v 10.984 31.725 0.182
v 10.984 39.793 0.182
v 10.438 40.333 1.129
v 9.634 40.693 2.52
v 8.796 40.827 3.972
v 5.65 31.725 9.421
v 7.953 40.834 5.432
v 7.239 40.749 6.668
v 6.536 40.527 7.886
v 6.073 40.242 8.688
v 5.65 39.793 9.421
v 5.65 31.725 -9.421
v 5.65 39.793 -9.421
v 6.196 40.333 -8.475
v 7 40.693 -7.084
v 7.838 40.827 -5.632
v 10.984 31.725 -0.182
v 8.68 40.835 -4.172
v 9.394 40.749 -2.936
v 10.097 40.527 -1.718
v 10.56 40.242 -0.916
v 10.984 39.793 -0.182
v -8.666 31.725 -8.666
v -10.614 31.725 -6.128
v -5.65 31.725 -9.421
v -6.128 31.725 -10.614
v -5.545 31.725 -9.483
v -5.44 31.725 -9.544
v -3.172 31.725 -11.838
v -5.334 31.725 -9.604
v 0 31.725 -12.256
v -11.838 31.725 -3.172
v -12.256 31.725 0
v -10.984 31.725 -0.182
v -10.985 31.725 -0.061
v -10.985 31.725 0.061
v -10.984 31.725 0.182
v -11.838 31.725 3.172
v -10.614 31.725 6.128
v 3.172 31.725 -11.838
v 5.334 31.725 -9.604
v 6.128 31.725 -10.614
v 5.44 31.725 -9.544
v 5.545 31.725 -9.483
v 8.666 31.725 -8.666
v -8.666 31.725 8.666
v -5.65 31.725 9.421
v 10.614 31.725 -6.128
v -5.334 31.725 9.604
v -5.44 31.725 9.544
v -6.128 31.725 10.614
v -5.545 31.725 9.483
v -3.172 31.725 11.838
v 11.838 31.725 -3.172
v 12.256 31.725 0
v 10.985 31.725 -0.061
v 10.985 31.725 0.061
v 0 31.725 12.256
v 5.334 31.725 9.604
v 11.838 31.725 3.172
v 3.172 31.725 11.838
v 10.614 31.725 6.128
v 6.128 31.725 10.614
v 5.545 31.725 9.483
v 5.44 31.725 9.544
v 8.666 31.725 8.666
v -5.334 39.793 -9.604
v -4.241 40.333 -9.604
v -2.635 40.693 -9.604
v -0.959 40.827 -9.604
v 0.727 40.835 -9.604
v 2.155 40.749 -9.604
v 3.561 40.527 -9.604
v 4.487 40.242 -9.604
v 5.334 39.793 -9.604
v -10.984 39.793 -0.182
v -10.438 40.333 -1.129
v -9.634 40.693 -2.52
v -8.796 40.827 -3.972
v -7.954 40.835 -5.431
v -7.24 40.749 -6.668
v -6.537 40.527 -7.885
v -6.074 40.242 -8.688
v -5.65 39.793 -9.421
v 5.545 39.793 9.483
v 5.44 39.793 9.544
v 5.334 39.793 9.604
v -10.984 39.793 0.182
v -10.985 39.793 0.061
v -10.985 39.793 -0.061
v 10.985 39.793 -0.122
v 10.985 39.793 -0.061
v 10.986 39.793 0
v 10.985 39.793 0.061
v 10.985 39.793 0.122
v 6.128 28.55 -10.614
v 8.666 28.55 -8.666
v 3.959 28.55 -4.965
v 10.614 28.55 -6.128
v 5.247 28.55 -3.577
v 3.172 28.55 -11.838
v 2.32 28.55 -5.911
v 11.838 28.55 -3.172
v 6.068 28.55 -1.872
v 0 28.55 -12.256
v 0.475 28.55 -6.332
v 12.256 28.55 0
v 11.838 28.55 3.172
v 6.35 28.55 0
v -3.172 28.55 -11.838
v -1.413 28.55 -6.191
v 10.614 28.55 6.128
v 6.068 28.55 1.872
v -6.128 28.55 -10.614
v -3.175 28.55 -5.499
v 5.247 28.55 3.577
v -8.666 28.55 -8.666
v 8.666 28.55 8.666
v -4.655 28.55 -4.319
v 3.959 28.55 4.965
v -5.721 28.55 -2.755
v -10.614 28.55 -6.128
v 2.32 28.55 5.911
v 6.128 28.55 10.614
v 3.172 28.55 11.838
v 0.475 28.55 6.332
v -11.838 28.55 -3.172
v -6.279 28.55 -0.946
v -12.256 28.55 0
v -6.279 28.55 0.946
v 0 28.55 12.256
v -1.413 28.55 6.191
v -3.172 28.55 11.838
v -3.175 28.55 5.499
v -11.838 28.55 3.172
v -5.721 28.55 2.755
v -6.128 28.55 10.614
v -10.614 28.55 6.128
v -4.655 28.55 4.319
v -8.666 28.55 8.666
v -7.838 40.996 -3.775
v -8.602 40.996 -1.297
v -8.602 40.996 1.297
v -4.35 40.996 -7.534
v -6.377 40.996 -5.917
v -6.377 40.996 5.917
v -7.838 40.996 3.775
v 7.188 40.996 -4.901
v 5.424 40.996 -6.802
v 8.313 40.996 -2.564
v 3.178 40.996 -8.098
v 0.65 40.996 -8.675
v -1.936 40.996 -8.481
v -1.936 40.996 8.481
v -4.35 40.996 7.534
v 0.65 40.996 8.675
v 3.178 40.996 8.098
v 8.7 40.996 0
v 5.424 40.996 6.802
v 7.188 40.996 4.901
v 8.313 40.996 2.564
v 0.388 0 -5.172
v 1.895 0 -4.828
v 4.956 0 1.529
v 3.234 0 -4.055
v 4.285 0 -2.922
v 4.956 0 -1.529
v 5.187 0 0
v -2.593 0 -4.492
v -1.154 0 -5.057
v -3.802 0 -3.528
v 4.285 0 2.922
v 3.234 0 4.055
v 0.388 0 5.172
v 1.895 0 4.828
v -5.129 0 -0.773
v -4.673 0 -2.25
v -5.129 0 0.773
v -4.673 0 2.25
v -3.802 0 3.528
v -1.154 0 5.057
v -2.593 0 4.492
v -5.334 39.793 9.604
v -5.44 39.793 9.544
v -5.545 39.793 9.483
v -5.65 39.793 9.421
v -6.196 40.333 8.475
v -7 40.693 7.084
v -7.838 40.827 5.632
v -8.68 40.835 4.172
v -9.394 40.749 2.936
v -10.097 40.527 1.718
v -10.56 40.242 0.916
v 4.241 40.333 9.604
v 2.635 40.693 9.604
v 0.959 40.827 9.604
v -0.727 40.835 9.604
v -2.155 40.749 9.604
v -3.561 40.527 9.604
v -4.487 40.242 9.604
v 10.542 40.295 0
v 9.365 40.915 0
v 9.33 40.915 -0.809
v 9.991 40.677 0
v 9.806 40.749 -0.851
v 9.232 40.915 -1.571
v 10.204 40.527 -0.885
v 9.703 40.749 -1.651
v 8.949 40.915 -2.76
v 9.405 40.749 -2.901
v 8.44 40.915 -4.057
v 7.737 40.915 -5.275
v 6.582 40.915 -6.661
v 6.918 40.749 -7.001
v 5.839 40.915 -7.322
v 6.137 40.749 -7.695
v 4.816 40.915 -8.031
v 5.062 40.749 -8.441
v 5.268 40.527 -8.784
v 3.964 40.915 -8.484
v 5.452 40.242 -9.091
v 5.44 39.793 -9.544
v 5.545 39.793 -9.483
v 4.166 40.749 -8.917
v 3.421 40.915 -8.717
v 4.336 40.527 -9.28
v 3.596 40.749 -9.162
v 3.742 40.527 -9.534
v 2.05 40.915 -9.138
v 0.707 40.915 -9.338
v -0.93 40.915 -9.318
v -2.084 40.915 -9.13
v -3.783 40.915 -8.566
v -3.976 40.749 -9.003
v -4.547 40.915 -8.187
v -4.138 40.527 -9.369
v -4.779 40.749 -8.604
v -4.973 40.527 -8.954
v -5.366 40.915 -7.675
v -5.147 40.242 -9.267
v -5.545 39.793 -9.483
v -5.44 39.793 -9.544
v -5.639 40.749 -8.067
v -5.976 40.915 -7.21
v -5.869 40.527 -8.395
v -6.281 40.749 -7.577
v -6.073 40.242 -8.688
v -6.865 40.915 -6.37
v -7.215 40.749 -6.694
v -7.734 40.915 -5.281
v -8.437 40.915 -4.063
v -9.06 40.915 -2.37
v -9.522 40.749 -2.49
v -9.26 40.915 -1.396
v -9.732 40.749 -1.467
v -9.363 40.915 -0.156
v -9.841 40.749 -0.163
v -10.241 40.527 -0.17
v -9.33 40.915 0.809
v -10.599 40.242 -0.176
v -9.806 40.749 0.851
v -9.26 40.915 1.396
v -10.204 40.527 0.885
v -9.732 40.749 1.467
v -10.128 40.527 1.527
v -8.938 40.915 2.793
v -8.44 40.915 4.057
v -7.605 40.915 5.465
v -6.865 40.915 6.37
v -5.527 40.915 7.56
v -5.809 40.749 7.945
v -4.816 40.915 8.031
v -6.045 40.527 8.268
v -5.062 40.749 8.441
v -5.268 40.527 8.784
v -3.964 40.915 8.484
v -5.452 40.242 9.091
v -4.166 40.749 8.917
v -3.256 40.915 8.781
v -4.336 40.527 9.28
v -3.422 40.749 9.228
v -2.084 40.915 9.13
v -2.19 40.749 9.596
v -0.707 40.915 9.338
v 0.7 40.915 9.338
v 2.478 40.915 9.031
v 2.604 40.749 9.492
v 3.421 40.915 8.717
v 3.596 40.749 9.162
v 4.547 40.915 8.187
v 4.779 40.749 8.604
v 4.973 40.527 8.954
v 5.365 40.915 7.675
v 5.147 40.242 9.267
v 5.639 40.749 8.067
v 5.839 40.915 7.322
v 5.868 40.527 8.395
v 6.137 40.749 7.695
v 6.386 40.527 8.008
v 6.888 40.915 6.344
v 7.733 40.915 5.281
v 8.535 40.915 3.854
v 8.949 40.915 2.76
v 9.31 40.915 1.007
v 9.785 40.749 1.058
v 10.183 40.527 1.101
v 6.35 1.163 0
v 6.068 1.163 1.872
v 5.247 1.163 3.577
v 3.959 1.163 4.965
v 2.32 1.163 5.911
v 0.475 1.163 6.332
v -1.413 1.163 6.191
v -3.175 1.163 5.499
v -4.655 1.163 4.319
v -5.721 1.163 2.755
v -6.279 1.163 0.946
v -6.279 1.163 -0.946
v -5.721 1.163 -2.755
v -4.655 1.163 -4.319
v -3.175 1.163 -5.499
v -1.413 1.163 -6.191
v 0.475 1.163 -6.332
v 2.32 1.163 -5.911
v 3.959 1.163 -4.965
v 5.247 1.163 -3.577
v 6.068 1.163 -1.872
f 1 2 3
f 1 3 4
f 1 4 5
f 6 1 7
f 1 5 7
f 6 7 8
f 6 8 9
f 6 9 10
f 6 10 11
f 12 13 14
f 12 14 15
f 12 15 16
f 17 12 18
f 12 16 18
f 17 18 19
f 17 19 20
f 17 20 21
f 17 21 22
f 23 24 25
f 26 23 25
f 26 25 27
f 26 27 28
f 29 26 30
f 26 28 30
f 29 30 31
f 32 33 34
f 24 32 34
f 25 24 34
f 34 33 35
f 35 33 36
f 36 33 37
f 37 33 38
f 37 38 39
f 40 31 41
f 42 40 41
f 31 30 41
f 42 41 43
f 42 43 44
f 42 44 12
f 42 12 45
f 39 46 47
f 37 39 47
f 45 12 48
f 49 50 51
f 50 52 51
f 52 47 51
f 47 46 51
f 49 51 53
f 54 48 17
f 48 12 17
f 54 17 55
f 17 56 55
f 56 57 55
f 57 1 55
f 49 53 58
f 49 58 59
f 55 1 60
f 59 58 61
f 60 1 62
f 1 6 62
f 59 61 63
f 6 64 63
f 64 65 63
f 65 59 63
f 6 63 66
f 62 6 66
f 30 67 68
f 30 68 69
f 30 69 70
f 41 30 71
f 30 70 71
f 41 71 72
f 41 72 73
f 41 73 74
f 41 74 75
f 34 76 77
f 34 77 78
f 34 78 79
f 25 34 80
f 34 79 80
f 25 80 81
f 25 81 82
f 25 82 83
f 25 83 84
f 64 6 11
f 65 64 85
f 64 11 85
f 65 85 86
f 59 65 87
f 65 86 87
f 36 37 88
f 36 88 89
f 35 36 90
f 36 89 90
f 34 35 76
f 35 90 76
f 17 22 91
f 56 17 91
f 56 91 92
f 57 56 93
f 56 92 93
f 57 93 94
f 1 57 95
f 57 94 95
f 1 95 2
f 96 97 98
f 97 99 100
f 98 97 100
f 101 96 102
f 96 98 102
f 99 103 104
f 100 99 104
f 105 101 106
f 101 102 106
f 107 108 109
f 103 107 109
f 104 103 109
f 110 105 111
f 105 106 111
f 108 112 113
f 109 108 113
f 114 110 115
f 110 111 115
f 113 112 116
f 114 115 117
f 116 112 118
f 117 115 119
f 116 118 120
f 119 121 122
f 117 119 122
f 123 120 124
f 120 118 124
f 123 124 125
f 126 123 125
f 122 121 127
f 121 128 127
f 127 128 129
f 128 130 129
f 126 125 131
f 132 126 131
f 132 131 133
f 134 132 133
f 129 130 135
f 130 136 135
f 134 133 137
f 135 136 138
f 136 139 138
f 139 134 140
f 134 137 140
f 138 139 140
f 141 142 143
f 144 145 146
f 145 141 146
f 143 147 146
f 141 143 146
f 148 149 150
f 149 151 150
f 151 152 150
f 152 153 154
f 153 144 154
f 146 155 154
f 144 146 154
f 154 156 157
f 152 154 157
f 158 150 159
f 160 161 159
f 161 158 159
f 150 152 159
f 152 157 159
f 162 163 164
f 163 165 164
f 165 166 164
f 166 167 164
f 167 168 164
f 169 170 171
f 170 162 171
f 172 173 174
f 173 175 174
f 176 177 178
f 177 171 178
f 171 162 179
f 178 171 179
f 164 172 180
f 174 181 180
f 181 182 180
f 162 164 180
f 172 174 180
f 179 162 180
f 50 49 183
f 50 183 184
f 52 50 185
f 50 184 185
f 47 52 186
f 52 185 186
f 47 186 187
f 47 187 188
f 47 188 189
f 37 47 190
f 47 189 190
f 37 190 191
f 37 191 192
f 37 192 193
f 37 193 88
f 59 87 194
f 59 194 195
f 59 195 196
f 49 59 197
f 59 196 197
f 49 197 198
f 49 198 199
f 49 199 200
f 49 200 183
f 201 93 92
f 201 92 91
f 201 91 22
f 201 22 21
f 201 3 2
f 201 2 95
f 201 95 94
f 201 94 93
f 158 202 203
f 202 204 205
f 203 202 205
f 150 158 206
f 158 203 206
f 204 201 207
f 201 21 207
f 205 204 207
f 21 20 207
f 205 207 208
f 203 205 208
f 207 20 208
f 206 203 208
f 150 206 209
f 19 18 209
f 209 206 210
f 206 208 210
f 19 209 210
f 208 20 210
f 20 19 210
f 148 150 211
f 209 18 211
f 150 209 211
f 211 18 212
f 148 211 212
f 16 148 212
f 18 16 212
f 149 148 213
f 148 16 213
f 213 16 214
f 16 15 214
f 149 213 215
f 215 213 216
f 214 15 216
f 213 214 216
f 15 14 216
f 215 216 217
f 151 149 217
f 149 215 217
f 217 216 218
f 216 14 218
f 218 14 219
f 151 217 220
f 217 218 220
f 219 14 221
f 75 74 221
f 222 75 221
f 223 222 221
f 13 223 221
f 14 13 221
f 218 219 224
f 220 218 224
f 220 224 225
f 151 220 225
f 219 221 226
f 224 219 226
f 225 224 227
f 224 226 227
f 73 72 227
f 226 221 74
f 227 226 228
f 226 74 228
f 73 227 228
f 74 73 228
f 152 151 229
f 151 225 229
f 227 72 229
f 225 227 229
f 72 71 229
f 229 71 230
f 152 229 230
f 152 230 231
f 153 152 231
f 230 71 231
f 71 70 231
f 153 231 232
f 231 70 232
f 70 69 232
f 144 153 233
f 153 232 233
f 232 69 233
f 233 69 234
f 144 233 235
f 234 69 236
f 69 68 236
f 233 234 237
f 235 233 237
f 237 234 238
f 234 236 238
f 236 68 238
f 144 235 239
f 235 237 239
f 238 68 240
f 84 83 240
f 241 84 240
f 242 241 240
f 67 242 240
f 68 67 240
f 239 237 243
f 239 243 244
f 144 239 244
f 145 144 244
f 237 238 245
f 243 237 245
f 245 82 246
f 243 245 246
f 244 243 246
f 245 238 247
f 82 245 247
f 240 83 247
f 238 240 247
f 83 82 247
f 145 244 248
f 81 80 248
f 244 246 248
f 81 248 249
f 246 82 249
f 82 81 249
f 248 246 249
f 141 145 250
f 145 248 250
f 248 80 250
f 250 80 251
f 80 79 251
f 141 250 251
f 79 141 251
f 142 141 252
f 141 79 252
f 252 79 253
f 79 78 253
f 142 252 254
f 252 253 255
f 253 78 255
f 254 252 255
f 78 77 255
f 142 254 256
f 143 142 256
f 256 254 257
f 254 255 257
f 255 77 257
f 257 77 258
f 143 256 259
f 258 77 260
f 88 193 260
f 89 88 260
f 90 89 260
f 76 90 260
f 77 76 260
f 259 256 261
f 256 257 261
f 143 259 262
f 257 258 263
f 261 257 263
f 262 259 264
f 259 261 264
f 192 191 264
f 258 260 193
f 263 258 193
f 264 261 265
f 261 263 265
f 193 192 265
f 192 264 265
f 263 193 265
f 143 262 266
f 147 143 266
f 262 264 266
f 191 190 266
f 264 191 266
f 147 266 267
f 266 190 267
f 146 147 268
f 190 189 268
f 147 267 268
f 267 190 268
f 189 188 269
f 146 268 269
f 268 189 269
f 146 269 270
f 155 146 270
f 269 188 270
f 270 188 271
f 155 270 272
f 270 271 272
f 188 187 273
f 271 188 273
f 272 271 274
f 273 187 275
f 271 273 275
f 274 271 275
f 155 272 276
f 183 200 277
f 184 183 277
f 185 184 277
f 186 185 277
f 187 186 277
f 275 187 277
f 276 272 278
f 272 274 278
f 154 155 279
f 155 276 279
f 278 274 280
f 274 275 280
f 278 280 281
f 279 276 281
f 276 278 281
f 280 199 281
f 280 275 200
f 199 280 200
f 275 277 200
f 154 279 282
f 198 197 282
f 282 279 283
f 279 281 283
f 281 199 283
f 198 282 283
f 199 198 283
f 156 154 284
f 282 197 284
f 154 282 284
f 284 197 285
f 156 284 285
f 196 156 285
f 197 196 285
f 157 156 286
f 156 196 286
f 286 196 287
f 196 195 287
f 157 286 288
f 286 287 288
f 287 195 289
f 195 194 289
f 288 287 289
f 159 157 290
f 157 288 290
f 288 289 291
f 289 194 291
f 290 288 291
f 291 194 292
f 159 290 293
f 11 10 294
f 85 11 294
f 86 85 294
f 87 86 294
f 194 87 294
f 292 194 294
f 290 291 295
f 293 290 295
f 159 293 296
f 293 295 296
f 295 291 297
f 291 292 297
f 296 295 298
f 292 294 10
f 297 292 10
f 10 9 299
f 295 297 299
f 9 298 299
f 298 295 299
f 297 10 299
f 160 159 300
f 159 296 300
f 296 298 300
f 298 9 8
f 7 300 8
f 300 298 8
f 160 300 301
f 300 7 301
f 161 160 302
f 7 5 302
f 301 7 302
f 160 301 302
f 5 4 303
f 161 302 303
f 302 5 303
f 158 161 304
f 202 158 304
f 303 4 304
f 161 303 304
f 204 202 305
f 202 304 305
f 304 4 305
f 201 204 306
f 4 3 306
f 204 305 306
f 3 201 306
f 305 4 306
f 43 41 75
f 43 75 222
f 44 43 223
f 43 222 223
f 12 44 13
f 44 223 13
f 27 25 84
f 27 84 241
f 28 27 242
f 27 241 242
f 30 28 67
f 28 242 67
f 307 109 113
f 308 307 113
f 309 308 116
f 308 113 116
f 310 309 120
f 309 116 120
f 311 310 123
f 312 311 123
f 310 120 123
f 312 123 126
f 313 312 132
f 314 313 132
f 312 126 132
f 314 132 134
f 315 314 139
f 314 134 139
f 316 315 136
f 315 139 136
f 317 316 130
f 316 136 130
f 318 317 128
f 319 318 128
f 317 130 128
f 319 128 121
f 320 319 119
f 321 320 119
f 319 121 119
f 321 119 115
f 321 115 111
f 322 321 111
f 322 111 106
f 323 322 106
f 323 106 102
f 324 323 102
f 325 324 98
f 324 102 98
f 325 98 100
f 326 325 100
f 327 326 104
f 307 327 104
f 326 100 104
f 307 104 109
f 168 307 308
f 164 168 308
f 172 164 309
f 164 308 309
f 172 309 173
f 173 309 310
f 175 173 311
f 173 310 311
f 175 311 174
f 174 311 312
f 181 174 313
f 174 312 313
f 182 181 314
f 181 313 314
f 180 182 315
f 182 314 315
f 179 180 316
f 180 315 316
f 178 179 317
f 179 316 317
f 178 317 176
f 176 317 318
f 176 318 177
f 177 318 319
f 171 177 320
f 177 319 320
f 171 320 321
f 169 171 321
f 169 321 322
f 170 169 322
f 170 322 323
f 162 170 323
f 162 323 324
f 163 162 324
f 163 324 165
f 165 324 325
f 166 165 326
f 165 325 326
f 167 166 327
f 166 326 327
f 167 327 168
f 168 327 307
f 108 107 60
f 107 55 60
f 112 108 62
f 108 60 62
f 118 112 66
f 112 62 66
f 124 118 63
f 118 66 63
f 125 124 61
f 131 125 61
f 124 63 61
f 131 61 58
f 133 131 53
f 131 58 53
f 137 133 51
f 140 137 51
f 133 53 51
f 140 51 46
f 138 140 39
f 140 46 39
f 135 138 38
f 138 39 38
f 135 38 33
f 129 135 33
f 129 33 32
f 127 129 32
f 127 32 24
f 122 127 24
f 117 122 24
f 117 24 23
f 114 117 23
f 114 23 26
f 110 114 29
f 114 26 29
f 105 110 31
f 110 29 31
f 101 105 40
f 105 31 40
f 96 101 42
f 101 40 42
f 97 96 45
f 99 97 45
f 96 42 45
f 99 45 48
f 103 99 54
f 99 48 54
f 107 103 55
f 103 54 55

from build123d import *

# Parameters (mm, degrees)
SKETCH2_W          = 10.668
SKETCH2_H          = 4.111930553
CUT_EXTRUDE1_DEPTH = 9.271
CIRPATTERN1_COUNT  = 6
CHAMFER1_SIZE      = 1.16332


with BuildPart() as part:
    # Sketch1 → Revolve1 (revolve)
    with BuildSketch(Plane.XY):
        Polygon((0, 0), (6.35, 0), (6.35, 28.5496), (12.2555, 28.5496), (12.2555, 31.7246), (10.9855, 31.7246), (10.9855, 40.9956), (0, 40.9956), align=None)
    revolve(axis=Axis((0, 40.9956, 0), (0, -1, 0)))

    # Sketch2 → Cut-Extrude1 (cut)
    with BuildSketch(Plane(origin=(0, 40.9956, 0), x_dir=(1, 0, 0), z_dir=(0, 1, 0))):
        with Locations((0, 11.659592417)):
            Rectangle(SKETCH2_W, SKETCH2_H)
    cut_extrude1 = extrude(amount=-CUT_EXTRUDE1_DEPTH, mode=Mode.SUBTRACT)

    # CirPattern1: Cut-Extrude1 ×6 about axis
    cirpattern1_axis = Axis((0, 0, 0), (0, 1, 0))
    for i in range(1, CIRPATTERN1_COUNT):
        add(cut_extrude1.rotate(cirpattern1_axis, i * 360 / CIRPATTERN1_COUNT), mode=Mode.SUBTRACT)

    # Sketch4 → Cut-Revolve1 (revolve, cut)
    with BuildSketch(Plane.XY):
        with BuildLine():
            Line((11.176, 39.4716), (11.176, 40.9956))
            Line((11.176, 40.9956), (8.6995, 40.9956))
            ThreePointArc((8.6995, 40.9956), (10.153428149, 40.584076992), (11.176, 39.4716))
        make_face()
    revolve(axis=Axis((0, -5.042553629, 0), (0, 1, 0)), mode=Mode.SUBTRACT)

    # Chamfer1
    chamfer1_edges = [part.edges().sort_by_distance(p)[0] for p in [
        (-6.35, 0, 0),
    ]]
    chamfer(chamfer1_edges, length=CHAMFER1_SIZE)


solid = part.part
